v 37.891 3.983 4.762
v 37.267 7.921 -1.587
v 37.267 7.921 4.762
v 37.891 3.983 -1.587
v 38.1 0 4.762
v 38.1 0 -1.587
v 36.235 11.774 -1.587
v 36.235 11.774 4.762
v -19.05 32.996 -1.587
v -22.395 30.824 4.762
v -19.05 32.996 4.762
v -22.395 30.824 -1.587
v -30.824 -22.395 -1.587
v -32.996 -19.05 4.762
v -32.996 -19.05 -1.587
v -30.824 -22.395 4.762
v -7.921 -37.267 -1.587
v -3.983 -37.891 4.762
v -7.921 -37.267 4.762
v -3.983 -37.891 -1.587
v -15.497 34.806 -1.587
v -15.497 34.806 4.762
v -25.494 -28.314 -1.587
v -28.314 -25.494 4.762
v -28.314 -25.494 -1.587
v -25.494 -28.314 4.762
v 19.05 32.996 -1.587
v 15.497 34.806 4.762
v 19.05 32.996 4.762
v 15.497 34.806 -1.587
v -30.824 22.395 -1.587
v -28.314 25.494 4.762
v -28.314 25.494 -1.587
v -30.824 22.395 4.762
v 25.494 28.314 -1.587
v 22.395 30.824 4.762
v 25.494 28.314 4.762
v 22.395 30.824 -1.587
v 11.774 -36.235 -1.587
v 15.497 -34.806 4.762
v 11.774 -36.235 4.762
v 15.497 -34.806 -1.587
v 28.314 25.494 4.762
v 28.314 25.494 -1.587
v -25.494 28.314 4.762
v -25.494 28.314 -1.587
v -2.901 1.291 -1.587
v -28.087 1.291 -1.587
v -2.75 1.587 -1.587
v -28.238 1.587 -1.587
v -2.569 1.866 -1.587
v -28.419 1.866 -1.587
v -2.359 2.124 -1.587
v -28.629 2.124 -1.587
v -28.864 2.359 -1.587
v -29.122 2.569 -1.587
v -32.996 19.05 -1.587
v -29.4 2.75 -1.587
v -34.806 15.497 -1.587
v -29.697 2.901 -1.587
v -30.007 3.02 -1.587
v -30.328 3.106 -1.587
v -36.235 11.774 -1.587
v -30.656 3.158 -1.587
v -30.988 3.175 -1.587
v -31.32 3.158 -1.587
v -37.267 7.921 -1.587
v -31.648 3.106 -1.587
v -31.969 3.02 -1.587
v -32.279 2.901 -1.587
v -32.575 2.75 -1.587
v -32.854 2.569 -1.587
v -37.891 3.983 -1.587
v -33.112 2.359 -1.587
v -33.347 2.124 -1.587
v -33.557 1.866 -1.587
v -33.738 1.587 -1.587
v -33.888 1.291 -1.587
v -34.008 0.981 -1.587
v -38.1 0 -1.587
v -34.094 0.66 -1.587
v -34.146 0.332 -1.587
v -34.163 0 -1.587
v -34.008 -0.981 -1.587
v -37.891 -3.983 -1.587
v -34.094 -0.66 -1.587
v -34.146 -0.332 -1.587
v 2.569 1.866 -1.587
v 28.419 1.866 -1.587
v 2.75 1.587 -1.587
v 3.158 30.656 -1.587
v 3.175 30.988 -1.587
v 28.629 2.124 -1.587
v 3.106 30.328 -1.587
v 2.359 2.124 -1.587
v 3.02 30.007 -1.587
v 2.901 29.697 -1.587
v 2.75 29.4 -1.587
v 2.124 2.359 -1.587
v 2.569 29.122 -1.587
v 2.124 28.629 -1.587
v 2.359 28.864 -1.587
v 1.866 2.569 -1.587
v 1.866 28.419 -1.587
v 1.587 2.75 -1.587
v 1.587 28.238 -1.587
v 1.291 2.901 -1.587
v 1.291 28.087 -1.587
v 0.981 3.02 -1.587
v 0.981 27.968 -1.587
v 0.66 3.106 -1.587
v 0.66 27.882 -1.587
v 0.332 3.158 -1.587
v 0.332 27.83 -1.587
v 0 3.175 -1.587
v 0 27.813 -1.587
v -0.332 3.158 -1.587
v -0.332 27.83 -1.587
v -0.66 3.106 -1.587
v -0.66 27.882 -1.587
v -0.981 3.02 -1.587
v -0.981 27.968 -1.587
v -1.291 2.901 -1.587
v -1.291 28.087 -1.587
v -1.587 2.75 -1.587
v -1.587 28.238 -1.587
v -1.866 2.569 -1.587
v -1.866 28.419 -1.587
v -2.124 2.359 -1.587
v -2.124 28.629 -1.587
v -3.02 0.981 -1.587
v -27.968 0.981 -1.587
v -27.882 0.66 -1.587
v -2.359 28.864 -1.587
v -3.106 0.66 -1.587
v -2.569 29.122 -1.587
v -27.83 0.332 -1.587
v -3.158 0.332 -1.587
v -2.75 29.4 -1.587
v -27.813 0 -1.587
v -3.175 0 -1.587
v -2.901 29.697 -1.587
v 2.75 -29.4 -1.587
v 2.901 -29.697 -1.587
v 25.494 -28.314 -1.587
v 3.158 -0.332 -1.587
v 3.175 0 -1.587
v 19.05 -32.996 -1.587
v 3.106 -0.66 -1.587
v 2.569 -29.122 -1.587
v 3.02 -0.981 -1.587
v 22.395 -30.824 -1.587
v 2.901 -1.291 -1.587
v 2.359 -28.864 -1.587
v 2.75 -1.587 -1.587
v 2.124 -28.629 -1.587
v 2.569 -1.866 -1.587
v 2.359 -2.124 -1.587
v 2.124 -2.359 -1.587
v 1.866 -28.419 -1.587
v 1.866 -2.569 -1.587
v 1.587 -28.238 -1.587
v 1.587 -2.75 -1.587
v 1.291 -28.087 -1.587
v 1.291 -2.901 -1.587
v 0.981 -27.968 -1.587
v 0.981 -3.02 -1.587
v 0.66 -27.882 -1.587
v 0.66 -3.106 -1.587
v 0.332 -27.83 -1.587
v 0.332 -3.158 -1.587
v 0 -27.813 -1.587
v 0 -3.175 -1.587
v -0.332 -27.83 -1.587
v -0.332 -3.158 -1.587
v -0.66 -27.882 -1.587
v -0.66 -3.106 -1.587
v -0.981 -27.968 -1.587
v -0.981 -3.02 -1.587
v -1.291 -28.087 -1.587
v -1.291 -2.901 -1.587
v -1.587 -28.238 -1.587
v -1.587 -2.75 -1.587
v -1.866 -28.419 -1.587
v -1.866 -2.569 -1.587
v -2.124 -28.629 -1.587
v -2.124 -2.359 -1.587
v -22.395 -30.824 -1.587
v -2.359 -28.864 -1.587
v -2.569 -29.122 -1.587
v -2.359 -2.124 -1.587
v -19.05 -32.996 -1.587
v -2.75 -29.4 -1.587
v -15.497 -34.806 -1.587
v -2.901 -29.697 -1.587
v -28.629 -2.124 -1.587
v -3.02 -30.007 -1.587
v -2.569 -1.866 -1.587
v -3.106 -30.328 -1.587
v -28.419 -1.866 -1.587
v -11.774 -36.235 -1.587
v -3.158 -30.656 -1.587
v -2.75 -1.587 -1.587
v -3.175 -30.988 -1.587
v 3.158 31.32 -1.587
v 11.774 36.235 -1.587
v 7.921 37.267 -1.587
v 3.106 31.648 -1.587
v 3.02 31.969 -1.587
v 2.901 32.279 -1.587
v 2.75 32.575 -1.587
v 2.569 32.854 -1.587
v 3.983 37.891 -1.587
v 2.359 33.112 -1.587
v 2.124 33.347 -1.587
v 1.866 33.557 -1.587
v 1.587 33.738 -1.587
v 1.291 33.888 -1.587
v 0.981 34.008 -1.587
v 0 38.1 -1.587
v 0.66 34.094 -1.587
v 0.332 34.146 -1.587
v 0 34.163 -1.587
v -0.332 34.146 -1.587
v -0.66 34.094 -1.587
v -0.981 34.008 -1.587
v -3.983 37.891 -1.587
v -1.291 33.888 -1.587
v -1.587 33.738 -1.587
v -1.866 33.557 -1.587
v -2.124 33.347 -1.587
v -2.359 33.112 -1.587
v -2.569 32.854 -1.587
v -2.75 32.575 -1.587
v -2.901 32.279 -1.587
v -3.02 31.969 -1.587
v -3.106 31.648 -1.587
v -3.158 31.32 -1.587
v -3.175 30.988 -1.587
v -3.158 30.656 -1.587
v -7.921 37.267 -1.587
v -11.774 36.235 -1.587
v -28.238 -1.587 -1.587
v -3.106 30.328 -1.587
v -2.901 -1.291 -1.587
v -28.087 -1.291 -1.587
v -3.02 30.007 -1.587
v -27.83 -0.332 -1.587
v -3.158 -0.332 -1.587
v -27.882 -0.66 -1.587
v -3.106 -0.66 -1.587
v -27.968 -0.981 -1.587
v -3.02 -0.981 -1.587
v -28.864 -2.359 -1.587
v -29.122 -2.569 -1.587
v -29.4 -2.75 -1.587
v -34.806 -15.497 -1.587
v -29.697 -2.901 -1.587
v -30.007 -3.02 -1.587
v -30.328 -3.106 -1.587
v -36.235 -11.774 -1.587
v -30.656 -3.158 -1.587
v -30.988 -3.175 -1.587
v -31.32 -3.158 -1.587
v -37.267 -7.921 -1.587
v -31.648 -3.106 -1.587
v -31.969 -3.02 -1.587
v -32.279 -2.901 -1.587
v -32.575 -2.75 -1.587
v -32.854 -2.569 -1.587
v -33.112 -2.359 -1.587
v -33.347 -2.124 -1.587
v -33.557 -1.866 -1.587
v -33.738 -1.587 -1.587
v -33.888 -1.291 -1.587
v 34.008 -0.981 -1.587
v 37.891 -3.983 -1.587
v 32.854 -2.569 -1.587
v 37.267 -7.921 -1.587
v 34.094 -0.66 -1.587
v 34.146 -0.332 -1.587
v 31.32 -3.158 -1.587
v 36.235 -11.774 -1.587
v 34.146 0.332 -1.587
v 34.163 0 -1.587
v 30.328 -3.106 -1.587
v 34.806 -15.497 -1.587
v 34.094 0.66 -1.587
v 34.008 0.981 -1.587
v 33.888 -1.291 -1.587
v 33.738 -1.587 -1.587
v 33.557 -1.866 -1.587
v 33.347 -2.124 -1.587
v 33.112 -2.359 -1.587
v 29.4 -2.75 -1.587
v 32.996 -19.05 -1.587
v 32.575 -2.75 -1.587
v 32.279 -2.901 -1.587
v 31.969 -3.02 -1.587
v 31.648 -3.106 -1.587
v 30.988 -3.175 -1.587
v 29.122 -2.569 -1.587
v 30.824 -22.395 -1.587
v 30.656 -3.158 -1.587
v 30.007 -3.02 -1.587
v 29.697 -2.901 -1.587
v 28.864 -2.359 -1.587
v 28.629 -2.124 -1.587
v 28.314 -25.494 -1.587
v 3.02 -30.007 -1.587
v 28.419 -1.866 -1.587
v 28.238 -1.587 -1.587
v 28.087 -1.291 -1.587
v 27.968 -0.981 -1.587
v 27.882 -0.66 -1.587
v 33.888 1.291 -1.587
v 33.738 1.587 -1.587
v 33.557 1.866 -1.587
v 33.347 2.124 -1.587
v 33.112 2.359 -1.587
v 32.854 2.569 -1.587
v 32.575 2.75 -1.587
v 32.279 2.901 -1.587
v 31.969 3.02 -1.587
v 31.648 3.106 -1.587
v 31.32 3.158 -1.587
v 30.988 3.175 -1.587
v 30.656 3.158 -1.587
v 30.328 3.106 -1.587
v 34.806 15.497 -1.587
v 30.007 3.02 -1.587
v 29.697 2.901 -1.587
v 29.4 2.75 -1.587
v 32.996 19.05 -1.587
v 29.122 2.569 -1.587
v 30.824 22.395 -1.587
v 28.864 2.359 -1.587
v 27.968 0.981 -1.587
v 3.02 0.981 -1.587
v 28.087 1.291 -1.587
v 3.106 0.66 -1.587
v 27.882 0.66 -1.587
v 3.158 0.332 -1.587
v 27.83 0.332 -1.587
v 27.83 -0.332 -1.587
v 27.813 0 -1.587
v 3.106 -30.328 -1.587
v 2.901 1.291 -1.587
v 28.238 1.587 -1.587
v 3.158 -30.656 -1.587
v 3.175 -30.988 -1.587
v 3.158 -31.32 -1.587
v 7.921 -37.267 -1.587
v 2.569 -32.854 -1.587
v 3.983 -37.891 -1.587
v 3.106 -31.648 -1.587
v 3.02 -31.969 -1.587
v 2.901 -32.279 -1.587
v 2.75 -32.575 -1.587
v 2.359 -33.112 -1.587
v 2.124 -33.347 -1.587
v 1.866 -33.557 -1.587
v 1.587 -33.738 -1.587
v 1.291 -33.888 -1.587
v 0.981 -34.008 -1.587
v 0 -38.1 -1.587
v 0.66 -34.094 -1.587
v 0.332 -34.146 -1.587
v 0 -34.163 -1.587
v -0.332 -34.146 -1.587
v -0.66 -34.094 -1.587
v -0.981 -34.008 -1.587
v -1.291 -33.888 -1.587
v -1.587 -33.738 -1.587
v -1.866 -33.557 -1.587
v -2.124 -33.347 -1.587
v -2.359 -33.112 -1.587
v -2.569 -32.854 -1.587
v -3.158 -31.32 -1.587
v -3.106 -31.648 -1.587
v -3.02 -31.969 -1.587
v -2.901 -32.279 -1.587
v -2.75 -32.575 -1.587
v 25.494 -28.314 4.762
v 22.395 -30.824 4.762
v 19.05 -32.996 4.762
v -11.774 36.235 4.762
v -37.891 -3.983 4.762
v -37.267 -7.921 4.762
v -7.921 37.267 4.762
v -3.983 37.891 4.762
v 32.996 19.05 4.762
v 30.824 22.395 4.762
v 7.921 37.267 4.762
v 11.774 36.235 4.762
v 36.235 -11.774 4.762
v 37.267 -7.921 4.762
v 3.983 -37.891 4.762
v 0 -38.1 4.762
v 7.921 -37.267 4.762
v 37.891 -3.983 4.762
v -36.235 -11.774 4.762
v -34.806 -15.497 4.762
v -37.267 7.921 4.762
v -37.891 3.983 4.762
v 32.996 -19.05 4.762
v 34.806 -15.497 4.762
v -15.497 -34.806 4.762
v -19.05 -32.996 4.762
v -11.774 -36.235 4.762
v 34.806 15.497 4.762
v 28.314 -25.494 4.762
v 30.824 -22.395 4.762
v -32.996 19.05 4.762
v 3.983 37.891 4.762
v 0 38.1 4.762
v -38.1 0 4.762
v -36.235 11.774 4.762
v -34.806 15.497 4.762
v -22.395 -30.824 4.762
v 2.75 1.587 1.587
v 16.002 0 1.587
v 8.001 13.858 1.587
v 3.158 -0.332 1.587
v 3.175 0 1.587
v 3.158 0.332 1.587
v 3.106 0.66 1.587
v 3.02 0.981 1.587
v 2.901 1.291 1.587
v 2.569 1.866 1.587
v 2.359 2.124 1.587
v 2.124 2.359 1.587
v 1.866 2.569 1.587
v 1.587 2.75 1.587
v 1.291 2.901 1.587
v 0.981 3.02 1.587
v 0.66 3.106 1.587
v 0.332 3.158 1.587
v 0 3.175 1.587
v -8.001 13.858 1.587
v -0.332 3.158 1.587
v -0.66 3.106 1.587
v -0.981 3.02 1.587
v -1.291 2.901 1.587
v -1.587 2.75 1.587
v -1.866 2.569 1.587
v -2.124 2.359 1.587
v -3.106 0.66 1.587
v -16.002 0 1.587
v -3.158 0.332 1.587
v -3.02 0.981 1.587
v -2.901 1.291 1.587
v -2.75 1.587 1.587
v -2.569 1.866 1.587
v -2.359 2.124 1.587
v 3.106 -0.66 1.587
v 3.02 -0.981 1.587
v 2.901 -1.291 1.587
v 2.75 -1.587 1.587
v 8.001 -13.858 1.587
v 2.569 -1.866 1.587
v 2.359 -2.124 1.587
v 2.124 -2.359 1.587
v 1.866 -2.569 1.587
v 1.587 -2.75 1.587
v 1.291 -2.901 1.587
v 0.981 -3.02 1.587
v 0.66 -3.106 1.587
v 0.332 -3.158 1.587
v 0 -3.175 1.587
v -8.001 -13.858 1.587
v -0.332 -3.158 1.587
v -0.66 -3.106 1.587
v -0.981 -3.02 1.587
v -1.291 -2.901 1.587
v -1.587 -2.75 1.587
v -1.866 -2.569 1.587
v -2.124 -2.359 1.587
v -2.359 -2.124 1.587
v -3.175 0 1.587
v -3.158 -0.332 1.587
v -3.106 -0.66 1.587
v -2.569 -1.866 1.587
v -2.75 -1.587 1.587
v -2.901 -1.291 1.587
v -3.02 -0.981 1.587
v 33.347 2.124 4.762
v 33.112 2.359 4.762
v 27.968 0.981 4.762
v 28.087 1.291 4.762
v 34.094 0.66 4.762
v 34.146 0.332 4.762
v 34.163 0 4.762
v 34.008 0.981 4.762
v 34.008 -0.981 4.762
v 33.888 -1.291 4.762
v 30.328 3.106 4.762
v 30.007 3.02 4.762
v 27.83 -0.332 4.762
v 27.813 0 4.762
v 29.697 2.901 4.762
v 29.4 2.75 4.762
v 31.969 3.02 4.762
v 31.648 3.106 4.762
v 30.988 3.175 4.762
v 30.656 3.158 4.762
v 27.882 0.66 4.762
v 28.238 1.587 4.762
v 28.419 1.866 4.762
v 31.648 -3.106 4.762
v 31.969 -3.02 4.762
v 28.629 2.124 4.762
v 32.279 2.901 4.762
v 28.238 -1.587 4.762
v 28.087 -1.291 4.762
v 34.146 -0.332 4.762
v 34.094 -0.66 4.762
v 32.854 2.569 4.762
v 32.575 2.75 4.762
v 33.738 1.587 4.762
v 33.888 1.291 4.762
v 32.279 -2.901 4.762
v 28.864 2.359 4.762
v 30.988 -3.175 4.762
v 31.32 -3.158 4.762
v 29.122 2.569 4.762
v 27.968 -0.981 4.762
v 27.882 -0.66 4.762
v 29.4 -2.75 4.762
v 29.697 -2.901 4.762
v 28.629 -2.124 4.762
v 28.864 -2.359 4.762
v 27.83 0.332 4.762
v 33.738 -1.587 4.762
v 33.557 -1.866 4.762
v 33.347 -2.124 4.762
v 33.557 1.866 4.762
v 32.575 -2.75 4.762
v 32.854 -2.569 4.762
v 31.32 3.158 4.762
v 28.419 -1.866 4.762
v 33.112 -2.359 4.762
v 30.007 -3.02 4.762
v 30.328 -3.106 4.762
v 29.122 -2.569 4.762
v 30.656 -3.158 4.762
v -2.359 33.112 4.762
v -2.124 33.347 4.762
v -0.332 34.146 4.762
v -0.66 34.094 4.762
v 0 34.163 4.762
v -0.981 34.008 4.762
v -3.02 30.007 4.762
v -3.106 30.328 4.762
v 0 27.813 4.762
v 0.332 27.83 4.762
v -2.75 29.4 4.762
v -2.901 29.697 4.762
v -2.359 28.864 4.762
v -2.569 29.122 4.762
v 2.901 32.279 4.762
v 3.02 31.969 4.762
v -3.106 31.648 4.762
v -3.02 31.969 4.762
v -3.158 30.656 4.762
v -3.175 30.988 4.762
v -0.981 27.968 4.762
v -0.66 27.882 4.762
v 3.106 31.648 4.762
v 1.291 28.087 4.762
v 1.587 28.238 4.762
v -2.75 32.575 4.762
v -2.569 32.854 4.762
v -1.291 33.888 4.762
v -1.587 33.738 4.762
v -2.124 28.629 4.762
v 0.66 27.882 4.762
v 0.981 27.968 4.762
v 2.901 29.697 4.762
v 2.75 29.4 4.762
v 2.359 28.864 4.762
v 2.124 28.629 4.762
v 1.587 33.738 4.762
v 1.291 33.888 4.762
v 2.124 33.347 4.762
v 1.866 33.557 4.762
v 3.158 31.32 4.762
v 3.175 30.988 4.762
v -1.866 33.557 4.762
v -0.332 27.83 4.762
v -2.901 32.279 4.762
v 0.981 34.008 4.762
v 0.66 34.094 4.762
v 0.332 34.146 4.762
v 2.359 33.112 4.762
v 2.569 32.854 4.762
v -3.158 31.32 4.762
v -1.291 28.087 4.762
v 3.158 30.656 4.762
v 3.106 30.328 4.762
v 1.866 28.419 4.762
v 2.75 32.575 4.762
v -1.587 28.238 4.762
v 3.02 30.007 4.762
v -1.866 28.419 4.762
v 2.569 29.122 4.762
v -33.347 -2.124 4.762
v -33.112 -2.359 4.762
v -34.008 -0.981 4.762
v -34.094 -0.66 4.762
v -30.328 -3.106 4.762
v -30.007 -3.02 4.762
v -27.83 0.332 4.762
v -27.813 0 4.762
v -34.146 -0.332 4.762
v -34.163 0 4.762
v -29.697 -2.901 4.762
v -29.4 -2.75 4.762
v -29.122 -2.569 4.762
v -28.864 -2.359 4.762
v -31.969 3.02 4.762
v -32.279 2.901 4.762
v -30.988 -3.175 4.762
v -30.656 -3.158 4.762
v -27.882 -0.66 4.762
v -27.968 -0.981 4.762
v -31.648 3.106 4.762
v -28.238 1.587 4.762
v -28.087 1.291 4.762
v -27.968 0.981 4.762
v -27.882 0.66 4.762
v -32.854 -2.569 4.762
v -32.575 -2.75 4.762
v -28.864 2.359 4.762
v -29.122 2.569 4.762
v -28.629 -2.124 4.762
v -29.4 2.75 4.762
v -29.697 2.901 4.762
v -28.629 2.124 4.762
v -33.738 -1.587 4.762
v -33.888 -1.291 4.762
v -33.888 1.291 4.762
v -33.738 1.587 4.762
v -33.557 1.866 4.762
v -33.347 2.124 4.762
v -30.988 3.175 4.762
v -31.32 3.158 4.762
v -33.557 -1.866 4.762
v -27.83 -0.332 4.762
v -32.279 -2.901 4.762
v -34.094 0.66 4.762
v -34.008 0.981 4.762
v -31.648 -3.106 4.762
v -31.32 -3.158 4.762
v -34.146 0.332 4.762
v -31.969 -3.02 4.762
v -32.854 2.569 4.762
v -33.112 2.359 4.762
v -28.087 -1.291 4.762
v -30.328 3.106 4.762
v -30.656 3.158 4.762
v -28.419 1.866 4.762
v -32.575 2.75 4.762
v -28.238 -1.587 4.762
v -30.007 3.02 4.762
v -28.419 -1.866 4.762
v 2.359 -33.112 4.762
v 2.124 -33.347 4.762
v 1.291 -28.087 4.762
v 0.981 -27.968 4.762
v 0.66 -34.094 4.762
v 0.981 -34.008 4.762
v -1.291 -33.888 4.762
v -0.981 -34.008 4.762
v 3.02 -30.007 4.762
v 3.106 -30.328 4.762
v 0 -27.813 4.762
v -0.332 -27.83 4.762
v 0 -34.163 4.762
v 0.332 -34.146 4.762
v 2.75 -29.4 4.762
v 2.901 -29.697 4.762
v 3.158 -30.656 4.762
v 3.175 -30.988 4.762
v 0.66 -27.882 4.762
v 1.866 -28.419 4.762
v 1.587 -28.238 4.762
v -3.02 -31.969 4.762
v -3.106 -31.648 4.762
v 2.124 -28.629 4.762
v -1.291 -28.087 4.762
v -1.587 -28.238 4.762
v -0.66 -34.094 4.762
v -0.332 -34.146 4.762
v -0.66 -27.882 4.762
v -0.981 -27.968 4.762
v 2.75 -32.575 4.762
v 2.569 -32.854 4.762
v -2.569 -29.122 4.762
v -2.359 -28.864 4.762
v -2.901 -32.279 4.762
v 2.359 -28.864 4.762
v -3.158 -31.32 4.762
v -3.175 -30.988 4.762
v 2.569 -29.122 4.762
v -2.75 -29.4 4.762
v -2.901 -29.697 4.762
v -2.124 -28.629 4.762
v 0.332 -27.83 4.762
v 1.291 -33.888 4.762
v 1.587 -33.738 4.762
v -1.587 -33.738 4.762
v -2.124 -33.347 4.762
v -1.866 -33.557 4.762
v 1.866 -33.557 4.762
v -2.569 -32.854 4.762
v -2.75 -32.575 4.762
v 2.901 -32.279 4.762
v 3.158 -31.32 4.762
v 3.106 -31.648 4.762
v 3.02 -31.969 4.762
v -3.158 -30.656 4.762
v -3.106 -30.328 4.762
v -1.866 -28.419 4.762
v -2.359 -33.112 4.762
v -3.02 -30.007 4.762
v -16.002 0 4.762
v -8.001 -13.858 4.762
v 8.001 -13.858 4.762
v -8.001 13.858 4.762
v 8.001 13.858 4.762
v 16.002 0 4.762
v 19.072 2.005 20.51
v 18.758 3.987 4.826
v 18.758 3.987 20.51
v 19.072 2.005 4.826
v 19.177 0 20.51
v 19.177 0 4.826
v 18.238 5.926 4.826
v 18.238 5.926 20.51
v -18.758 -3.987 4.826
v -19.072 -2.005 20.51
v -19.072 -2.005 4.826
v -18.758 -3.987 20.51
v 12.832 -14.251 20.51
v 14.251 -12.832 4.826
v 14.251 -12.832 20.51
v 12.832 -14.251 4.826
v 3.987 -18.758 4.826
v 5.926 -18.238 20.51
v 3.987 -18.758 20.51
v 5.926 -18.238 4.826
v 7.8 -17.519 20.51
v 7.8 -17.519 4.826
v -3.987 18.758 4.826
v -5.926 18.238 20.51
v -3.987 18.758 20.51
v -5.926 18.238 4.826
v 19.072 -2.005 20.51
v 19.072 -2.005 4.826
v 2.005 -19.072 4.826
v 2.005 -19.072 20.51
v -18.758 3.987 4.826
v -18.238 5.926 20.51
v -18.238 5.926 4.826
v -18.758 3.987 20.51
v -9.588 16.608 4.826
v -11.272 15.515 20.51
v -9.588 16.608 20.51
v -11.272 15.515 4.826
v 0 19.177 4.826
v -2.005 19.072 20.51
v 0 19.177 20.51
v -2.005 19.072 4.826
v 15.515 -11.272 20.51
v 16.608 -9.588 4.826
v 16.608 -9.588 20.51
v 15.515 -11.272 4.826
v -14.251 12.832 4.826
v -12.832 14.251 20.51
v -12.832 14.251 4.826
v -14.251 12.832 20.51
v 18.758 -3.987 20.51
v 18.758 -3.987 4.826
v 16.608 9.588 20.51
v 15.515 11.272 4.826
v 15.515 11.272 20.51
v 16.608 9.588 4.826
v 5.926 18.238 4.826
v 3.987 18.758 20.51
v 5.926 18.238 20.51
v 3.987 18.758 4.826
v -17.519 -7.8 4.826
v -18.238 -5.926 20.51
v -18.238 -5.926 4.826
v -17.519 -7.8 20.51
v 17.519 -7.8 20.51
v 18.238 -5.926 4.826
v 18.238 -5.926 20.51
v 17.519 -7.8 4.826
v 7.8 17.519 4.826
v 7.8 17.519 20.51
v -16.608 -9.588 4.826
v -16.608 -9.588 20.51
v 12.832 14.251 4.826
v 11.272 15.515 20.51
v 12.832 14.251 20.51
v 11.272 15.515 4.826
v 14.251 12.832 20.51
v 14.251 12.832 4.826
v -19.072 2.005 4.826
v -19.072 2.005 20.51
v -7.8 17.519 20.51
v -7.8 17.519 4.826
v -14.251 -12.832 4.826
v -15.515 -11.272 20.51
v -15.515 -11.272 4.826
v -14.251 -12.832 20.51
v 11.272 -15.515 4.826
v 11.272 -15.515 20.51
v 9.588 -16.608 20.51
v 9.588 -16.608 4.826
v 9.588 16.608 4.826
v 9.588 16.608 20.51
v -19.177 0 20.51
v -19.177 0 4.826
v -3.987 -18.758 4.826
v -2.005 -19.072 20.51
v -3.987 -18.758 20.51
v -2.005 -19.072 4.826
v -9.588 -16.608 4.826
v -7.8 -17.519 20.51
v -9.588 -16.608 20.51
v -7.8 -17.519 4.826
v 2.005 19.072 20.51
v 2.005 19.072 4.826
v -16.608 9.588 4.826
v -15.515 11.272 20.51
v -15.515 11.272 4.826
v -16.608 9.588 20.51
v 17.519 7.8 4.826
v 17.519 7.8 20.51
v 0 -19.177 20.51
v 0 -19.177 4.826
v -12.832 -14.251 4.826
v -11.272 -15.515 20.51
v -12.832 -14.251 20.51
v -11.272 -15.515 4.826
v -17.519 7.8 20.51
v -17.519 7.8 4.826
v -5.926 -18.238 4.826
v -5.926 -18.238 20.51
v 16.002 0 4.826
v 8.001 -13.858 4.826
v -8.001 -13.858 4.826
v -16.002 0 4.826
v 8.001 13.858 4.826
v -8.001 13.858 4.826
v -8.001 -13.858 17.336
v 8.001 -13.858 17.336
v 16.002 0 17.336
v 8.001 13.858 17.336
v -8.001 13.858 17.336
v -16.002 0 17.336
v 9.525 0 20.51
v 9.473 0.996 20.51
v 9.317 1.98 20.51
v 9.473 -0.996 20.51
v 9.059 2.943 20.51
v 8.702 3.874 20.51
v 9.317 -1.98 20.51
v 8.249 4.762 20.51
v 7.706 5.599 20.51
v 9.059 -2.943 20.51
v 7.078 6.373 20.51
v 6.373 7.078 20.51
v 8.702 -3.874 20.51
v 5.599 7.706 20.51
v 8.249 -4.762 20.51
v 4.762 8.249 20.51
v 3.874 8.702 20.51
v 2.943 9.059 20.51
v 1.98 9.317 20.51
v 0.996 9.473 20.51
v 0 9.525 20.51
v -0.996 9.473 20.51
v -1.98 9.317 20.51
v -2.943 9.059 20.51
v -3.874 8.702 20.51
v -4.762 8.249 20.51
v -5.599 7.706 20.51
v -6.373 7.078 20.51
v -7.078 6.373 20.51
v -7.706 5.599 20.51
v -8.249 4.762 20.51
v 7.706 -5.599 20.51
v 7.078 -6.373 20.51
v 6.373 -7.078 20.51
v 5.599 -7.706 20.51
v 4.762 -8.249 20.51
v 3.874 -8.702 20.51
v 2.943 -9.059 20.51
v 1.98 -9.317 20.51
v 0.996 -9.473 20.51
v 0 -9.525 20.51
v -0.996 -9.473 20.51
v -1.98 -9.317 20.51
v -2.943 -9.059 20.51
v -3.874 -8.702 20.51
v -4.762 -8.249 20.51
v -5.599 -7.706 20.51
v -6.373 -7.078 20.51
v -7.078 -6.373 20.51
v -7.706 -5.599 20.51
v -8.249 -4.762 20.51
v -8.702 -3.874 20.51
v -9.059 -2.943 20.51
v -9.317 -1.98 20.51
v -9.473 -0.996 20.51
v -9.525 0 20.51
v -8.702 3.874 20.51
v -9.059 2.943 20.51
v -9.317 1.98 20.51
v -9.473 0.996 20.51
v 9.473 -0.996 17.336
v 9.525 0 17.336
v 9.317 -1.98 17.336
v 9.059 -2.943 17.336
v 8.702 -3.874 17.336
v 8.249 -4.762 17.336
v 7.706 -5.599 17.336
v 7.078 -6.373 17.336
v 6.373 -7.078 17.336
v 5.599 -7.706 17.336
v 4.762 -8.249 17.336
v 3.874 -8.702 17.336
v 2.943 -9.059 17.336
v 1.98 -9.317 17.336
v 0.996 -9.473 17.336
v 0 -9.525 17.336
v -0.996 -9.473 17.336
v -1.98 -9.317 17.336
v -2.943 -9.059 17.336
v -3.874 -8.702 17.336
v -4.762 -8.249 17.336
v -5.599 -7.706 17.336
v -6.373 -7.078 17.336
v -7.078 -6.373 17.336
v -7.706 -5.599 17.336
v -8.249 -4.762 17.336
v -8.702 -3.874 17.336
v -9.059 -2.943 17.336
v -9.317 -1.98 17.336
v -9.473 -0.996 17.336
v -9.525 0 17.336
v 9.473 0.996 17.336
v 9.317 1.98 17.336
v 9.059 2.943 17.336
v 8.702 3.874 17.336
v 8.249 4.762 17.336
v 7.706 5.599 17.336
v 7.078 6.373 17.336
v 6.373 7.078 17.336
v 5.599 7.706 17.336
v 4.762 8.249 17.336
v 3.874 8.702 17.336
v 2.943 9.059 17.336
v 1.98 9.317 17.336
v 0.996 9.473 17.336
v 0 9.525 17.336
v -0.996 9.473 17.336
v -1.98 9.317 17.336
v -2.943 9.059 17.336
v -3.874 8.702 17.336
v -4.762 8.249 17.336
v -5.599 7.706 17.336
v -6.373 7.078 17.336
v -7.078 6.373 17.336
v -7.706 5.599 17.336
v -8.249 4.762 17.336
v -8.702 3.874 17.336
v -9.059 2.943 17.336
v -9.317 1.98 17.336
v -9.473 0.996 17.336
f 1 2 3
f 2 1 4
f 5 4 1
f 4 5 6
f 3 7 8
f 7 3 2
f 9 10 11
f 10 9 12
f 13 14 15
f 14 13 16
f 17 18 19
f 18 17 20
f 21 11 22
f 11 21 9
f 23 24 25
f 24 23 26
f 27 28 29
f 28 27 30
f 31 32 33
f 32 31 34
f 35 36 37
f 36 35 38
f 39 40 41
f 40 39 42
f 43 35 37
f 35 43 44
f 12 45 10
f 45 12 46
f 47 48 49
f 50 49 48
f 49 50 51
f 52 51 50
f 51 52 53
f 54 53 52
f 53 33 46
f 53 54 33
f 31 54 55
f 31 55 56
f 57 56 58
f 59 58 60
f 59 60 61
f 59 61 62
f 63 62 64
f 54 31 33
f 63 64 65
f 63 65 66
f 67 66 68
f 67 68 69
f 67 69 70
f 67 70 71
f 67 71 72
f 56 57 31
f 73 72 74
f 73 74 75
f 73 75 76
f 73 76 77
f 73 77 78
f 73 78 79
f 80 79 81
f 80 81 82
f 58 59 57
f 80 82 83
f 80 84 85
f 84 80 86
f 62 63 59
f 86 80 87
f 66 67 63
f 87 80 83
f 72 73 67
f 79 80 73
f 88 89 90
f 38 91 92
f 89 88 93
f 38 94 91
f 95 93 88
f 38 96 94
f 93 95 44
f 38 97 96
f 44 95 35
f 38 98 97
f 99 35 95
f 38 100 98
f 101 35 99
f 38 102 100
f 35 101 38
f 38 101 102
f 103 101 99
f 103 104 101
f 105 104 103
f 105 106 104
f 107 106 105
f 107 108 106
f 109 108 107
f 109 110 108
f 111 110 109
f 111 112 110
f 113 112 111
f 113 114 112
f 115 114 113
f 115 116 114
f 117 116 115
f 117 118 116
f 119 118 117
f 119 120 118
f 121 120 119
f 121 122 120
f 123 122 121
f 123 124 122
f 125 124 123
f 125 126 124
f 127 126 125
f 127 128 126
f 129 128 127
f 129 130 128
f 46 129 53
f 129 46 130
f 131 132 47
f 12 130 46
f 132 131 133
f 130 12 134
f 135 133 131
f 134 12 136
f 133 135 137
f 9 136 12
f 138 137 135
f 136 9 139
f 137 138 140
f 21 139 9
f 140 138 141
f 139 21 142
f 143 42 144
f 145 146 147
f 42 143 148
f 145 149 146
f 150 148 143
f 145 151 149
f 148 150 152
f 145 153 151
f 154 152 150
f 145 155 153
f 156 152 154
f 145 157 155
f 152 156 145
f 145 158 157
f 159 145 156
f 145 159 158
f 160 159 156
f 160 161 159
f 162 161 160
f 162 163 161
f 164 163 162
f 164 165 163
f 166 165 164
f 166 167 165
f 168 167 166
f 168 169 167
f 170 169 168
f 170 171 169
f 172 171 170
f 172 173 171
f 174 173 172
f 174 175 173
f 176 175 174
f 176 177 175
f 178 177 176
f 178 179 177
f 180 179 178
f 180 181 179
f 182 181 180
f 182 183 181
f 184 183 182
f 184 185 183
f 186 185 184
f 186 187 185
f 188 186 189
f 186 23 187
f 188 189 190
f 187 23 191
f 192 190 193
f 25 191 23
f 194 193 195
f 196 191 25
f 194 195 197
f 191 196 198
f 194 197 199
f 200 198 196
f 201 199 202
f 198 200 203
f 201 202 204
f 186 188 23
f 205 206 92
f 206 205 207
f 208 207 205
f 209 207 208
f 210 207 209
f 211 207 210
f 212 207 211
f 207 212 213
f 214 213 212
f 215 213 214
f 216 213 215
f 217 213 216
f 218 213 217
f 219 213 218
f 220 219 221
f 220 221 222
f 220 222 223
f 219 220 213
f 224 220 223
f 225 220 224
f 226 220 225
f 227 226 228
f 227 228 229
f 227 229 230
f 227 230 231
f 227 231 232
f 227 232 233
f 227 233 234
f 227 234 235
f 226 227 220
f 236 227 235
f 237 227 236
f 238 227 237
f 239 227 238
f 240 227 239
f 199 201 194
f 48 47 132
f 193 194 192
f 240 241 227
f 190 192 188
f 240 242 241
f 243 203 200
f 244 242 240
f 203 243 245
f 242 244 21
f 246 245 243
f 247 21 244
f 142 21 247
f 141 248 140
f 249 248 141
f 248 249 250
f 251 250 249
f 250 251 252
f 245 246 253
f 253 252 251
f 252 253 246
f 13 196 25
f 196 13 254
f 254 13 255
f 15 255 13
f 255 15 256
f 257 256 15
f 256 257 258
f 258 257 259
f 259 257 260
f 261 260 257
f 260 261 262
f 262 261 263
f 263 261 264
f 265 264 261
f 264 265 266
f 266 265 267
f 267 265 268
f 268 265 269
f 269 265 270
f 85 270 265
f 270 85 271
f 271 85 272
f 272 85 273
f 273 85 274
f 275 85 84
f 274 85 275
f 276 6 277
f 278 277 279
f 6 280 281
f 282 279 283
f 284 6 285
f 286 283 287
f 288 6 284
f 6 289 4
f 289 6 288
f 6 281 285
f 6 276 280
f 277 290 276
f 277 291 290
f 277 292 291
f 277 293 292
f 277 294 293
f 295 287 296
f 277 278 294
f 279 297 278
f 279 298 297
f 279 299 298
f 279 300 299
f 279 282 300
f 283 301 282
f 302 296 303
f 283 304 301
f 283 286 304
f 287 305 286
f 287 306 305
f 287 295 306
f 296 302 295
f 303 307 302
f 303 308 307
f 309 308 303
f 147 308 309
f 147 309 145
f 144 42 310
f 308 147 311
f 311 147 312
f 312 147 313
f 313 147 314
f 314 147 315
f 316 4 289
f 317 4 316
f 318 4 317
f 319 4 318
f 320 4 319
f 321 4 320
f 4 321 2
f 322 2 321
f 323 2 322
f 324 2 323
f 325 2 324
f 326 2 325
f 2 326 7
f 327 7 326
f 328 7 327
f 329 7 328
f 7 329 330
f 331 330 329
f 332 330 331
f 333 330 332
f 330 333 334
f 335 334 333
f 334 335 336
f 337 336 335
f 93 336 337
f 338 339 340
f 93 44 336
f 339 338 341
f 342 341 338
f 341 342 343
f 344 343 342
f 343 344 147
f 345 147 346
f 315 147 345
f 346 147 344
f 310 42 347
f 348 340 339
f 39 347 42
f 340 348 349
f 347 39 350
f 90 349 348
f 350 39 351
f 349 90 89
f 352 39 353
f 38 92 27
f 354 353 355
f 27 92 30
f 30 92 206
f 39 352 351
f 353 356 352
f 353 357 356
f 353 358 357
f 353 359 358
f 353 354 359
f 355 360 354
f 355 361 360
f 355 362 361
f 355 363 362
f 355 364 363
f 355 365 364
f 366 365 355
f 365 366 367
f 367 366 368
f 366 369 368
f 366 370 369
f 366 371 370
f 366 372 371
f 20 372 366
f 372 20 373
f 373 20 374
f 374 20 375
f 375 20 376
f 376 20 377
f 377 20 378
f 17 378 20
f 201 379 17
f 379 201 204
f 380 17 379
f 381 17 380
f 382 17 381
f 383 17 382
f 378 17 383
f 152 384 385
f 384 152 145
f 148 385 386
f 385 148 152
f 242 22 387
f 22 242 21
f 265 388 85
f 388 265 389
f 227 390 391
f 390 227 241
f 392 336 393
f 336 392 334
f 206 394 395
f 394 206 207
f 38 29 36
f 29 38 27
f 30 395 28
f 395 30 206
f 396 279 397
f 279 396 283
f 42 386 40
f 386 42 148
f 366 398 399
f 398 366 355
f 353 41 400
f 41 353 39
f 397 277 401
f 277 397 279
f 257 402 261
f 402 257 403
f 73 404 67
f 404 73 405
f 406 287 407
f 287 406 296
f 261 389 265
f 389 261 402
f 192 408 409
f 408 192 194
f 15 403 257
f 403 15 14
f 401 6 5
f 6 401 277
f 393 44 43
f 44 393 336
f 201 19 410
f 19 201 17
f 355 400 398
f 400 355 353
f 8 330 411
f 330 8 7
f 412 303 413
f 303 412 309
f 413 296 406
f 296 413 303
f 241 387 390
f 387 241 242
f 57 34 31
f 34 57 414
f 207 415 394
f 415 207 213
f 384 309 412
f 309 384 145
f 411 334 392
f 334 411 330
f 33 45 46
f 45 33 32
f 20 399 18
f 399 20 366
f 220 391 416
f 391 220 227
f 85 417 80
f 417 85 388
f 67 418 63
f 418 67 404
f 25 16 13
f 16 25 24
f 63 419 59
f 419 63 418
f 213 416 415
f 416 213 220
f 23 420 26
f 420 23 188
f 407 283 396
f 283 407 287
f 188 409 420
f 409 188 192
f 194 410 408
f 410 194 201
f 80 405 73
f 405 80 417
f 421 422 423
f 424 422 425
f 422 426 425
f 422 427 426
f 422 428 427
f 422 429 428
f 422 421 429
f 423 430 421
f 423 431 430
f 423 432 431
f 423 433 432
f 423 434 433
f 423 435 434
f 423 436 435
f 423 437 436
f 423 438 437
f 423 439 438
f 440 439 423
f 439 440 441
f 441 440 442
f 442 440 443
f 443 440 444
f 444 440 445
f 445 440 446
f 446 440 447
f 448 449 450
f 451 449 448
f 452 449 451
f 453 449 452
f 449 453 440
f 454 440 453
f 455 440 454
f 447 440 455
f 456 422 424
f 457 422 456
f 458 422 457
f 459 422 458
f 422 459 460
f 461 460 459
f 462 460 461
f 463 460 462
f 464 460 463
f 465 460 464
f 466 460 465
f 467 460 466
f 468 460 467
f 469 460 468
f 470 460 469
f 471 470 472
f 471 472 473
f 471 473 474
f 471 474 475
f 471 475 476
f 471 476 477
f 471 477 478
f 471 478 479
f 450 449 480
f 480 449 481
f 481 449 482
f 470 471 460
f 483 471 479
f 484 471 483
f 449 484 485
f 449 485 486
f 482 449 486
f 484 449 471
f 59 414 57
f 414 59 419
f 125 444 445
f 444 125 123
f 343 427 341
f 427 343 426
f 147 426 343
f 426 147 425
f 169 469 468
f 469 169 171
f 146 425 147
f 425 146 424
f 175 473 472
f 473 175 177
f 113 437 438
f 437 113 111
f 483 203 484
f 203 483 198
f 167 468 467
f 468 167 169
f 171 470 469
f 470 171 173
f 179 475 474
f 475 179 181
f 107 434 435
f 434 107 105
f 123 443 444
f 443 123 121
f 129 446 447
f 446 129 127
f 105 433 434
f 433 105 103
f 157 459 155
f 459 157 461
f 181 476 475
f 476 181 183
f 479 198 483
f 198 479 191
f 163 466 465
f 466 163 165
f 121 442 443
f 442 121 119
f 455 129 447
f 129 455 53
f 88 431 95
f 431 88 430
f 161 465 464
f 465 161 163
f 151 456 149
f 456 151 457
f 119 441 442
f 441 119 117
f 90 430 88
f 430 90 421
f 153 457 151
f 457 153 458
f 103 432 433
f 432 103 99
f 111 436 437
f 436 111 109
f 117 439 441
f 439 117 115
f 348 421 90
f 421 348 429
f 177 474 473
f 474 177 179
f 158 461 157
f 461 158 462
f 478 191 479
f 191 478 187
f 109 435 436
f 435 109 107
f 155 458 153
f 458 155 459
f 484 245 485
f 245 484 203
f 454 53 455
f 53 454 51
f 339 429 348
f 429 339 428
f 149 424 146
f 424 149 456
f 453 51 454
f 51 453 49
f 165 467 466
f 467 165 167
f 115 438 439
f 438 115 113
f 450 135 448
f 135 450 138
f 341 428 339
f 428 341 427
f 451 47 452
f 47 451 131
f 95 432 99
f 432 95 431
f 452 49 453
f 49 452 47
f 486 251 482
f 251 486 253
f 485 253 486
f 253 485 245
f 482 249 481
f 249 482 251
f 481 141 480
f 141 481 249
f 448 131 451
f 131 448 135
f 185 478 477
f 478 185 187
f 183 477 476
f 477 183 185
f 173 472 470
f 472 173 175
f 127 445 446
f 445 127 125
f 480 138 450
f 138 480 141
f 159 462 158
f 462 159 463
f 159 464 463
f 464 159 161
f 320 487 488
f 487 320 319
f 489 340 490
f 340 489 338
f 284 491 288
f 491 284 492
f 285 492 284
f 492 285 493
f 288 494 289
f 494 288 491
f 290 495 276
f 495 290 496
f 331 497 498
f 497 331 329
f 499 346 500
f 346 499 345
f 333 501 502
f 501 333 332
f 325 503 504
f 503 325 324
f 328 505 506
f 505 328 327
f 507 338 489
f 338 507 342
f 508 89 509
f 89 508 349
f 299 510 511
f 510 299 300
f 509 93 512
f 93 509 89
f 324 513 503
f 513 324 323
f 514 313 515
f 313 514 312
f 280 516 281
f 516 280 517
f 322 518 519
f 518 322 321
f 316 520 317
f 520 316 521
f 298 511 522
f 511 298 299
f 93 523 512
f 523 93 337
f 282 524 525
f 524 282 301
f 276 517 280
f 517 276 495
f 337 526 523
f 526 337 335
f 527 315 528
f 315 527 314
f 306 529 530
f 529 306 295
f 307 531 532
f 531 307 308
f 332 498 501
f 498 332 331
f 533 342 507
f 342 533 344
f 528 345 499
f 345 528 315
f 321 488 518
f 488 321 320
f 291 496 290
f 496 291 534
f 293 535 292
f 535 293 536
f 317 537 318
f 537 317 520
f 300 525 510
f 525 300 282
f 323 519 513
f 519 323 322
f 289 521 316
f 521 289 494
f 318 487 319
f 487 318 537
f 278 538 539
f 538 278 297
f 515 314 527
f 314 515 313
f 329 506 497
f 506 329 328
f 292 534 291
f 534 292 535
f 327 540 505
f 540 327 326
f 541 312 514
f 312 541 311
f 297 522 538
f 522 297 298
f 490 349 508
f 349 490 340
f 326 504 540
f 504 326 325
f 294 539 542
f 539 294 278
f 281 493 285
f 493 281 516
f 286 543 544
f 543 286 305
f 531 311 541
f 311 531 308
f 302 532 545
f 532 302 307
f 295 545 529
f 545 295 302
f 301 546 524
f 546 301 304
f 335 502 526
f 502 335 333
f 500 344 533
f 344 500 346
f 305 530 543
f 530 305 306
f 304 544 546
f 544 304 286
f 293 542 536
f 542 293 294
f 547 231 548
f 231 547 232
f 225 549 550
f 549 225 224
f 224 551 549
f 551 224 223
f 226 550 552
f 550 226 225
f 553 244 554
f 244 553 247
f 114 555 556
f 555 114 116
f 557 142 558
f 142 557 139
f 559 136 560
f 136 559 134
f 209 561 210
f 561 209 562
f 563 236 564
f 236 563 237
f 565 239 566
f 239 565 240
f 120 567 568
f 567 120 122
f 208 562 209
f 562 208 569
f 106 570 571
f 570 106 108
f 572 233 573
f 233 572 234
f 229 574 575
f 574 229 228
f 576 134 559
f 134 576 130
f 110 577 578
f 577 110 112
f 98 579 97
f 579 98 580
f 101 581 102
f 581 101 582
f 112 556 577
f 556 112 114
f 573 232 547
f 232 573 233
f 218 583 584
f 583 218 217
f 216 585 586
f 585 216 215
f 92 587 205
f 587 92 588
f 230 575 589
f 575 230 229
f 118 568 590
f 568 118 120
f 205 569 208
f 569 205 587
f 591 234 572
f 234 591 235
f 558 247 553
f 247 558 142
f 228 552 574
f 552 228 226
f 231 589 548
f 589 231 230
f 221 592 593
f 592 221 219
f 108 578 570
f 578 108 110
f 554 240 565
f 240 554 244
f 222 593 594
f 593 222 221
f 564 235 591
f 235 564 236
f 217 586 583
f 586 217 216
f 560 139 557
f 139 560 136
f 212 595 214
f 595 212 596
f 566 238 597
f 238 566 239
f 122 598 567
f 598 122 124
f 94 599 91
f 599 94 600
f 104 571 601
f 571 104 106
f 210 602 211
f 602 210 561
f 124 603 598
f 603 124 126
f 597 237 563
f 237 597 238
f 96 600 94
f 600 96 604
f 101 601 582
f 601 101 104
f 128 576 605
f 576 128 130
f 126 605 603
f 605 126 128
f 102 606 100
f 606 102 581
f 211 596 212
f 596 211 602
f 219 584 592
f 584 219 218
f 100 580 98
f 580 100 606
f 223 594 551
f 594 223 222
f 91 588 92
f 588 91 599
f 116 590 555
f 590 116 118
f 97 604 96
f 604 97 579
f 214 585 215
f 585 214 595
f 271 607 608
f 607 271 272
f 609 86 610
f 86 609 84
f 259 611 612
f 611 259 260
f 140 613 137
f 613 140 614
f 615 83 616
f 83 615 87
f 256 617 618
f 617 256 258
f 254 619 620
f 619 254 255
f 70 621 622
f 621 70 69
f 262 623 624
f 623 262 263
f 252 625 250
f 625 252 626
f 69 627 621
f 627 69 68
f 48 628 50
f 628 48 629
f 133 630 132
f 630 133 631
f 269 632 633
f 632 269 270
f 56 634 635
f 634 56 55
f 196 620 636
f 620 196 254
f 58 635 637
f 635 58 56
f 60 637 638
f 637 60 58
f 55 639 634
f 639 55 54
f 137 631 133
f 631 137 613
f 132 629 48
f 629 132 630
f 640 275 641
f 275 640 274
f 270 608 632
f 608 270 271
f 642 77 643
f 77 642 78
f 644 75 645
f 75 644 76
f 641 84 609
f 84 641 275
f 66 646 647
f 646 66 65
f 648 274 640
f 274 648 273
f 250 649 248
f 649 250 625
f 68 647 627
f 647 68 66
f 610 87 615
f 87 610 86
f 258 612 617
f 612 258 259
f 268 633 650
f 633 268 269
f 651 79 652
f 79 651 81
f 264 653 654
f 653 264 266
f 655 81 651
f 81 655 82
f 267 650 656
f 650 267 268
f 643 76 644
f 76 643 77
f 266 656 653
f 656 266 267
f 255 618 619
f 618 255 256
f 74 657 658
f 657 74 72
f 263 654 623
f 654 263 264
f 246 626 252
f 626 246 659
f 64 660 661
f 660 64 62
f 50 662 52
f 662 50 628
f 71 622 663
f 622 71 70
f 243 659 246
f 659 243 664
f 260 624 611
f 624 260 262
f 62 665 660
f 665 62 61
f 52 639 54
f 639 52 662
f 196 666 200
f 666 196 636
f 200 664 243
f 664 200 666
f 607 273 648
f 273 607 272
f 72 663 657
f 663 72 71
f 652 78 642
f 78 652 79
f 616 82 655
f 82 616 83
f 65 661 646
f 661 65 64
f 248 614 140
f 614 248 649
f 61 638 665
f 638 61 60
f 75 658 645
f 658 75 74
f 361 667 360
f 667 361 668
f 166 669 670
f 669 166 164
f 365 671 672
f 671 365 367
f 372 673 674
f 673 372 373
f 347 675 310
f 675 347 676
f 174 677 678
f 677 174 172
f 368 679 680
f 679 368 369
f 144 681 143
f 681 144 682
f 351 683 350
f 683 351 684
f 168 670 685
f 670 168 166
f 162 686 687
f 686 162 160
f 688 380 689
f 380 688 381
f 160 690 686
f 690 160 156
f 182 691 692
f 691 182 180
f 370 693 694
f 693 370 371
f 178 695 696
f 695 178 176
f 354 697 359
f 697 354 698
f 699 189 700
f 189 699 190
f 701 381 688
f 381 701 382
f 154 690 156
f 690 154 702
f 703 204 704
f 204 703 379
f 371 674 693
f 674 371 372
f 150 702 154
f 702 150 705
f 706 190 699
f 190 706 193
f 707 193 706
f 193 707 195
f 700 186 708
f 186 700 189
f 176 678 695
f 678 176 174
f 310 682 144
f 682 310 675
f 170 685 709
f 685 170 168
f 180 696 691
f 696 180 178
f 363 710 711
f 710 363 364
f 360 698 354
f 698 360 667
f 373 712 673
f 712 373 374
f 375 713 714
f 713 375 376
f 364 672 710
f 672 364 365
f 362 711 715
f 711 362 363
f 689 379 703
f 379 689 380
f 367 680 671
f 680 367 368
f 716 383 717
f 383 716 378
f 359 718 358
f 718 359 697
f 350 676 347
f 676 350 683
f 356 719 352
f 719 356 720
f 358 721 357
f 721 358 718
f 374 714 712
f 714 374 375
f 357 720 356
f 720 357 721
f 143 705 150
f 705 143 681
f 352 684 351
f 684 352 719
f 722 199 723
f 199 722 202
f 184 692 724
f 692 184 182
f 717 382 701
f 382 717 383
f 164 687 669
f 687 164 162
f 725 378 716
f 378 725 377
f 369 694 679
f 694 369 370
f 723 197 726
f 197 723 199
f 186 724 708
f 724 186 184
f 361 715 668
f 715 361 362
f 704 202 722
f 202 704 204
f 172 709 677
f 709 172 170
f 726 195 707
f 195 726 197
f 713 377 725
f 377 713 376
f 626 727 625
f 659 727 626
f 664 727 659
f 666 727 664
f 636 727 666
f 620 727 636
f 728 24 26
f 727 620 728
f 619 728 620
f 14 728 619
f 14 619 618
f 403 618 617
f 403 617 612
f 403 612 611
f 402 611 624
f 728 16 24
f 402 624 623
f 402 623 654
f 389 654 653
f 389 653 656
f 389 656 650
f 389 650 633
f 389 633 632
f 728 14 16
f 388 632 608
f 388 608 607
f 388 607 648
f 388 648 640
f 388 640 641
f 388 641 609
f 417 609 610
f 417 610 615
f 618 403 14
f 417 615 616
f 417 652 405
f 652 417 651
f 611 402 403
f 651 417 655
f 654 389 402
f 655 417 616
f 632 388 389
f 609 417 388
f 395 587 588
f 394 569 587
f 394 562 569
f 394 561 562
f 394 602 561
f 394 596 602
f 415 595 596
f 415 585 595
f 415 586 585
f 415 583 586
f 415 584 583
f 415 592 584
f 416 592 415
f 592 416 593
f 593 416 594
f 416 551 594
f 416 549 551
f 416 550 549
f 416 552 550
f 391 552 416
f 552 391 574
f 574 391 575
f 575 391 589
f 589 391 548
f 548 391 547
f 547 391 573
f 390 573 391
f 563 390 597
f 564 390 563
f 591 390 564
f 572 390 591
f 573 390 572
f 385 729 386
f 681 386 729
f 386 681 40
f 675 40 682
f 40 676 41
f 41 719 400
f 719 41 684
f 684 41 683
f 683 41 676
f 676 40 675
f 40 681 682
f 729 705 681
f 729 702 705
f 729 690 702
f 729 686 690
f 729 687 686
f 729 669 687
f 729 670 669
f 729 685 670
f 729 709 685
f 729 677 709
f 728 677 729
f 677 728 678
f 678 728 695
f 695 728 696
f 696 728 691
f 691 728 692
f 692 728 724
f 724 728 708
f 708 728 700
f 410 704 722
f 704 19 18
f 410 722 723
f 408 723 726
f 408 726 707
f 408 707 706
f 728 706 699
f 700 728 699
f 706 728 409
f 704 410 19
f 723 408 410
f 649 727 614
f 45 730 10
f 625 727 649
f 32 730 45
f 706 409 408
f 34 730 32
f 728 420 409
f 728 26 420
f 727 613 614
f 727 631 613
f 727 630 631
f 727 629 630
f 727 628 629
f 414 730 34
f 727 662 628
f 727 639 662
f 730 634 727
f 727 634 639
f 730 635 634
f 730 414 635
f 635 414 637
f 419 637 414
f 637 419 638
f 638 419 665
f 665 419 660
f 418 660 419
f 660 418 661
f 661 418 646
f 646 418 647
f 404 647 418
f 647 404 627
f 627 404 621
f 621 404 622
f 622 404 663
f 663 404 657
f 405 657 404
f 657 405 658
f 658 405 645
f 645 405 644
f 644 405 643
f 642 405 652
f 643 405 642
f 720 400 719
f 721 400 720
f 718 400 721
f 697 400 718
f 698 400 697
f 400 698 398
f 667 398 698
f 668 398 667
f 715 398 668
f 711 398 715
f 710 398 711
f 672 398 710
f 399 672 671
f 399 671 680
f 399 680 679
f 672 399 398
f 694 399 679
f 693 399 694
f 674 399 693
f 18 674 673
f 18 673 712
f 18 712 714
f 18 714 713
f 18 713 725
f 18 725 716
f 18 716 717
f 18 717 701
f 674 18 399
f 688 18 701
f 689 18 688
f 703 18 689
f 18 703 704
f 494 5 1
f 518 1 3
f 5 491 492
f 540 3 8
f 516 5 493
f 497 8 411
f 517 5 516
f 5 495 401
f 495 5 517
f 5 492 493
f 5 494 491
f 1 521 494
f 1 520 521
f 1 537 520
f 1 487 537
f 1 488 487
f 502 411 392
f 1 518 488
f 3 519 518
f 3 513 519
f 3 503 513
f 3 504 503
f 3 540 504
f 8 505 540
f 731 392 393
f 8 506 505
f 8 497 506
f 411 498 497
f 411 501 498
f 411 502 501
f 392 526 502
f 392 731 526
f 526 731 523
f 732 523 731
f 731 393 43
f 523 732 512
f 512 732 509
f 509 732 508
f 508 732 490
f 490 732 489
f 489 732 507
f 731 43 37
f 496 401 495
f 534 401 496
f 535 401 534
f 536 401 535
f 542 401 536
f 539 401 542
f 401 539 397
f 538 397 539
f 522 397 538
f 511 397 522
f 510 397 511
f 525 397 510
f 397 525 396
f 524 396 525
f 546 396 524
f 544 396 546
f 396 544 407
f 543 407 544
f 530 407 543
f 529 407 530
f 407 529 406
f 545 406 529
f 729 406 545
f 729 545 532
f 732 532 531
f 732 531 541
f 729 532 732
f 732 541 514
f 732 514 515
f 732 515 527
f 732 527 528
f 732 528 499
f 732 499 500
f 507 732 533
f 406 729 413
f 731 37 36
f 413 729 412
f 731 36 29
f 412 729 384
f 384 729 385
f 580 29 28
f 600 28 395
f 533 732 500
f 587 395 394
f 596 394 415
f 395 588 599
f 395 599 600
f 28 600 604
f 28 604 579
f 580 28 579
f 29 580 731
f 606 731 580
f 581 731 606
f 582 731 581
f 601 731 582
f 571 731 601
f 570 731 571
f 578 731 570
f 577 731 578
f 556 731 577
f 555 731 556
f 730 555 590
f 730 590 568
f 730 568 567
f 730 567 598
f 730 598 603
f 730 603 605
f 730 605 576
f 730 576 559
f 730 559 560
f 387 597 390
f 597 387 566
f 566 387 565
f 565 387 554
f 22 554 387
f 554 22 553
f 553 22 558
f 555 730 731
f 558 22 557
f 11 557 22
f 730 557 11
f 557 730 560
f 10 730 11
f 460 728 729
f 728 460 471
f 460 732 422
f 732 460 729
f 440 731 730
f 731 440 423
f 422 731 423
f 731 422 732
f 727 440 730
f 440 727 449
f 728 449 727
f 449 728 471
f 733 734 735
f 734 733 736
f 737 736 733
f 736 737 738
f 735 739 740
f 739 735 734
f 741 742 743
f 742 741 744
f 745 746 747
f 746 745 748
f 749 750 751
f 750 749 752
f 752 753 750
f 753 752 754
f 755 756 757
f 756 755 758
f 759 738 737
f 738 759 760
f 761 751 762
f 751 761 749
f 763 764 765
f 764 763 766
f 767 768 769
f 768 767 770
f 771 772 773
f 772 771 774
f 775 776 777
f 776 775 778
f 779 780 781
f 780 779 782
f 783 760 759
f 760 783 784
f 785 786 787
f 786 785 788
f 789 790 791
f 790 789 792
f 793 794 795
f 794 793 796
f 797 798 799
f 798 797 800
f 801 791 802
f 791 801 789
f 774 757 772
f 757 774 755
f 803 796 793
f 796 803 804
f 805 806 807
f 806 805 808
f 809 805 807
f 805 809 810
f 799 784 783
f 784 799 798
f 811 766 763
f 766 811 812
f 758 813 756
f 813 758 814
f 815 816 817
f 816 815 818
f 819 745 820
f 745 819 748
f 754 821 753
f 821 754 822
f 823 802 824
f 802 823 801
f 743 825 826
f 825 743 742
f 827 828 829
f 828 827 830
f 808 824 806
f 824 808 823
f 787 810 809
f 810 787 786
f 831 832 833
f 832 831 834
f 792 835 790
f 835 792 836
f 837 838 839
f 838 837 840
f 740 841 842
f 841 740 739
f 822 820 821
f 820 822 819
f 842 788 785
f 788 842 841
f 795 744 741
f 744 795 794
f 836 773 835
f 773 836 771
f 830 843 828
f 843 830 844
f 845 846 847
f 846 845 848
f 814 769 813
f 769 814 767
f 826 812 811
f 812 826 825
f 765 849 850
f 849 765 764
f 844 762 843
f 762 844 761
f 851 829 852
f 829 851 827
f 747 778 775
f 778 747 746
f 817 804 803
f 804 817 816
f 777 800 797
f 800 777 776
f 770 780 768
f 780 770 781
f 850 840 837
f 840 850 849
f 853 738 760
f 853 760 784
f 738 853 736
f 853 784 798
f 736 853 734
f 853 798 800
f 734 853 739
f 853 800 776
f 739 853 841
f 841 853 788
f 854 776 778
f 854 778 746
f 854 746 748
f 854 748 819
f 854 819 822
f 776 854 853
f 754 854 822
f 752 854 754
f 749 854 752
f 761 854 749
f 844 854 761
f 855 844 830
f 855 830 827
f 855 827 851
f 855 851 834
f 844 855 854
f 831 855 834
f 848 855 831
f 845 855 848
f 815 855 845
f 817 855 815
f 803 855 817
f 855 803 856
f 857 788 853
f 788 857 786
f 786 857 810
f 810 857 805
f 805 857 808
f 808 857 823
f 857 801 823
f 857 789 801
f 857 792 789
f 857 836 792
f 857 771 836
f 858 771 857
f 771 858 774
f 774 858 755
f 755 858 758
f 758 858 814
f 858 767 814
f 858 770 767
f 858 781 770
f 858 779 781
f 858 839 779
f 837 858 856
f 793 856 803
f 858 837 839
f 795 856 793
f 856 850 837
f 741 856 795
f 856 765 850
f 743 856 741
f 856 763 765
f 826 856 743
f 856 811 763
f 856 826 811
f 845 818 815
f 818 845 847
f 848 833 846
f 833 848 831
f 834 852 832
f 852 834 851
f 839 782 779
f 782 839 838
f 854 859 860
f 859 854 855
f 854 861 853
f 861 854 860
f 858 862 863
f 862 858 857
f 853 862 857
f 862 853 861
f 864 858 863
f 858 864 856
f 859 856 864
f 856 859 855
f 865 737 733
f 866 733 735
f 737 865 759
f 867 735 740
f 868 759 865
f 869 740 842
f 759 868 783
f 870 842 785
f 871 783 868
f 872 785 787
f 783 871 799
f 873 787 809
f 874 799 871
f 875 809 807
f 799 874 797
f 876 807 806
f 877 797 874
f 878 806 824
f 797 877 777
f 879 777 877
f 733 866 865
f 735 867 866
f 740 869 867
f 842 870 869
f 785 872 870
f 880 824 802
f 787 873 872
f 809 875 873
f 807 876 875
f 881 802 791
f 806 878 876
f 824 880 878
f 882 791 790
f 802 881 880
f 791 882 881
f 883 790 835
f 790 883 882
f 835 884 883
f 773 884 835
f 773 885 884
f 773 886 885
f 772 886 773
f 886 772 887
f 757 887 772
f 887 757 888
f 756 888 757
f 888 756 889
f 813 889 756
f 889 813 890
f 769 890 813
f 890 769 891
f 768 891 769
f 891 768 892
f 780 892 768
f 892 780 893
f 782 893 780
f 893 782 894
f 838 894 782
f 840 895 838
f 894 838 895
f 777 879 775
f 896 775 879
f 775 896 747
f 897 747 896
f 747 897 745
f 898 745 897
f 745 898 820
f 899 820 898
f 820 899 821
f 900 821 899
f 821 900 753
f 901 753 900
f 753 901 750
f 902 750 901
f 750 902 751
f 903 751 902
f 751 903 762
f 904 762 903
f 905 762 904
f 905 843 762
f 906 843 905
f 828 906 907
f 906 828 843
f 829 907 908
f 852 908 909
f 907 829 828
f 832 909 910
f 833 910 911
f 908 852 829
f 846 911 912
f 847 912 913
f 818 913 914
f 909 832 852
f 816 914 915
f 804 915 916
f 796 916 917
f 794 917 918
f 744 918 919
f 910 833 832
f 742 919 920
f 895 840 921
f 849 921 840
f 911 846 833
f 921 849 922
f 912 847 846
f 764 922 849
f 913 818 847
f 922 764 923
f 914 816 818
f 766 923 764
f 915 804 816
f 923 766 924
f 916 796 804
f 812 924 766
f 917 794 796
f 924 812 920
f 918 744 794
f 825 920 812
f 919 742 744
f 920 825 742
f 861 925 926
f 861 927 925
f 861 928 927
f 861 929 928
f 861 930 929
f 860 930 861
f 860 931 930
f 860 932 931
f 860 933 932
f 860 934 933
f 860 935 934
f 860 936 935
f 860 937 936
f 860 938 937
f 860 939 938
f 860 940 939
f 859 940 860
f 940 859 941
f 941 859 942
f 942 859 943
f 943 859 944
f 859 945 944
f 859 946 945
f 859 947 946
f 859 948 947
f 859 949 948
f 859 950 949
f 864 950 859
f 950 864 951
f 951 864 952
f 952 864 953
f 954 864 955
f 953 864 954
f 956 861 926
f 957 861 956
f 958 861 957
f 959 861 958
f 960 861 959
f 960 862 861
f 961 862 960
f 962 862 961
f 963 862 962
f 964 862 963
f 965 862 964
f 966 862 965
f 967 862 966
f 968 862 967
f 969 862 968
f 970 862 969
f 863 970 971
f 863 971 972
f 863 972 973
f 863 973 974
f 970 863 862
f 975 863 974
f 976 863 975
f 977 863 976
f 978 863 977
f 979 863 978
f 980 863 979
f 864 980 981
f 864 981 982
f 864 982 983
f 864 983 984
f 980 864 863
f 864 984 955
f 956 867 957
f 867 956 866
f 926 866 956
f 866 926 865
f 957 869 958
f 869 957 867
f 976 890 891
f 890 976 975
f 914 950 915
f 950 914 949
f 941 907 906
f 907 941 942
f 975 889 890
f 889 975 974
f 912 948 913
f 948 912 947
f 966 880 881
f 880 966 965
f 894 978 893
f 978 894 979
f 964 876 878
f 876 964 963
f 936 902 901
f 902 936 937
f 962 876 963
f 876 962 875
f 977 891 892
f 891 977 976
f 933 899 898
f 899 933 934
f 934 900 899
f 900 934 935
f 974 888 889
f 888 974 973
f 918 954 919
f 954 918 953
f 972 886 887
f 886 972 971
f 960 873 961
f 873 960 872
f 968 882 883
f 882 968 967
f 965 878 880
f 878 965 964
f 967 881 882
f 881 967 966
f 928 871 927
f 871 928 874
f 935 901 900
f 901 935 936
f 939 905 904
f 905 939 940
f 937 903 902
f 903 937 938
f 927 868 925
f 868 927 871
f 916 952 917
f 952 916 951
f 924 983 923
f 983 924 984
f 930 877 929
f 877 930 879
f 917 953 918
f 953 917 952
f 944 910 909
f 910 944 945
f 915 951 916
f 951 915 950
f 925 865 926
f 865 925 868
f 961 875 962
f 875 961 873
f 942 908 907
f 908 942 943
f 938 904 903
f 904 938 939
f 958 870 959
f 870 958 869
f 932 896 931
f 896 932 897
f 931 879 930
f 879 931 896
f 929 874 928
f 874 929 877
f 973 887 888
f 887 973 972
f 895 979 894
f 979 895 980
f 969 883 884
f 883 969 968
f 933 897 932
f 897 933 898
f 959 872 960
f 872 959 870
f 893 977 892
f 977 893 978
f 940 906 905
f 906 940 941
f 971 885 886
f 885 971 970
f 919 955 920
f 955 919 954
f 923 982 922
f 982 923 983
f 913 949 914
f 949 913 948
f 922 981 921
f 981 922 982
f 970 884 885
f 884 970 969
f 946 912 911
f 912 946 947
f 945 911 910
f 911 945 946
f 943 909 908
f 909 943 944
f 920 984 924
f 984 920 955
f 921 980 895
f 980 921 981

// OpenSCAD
//Chuck Adapter for Wooden Lathe

spindle=.75;

chuck=3;

nutsurround=.25;
nutsize=1.26; //longest point to point outside of nut
nutthick=.62;

materialthick=.125;

centerbolt=.25;

mountholenum=4;
mountholedia=.25;

res=60;

module nut(){
difference(){
cylinder(h=nutthick, d=nutsize, center=true, $fn=6);
cylinder(h=nutthick, d=spindle, center=true, $fn=res);
}
}

module solidnut(){
difference(){
    cylinder(h=nutthick, d=nutsize, center=true, $fn=6);
}
}

module nutspindle(){
    difference(){
        cylinder(h=materialthick, d=nutsize+nutsurround, center=true, $fn=res);
        cylinder(h=materialthick, d=spindle, center=true, $fn=res);
    }
}

module chucknut(){
difference(){
    cylinder(h=nutthick-materialthick, d=nutsize+nutsurround, center=true, $fn=res);
    solidnut();
}
}

module mountnut(){
    difference(){
        difference(){
        cylinder(h=materialthick, d=chuck, center=true, $fn=res);
        solidnut();
    }
    for (i=[0:mountholenum])
        {rotate([0,0,i*360/mountholenum])
        translate ([(chuck/2-(nutthick/2+nutsurround)/2), 0, 0])cylinder(h=materialthick, d=mountholedia, center=true, $fn=res);}
}
}

module mountplate(){
difference(){
    difference(){
        cylinder(h=materialthick, d=chuck, center=true, $fn=res);
        cylinder(h=materialthick, d=centerbolt, center=true, $fn=res);
    }
    for (i=[0:mountholenum])
        {rotate([0,0,i*360/mountholenum])
        translate ([(chuck/2-(nutthick/2+nutsurround)/2), 0, 0])cylinder(h=materialthick, d=mountholedia, center=true, $fn=res);}
}
}


module fulladapter(){
    mountplate();
    translate([0,0,materialthick]) mountnut();
    translate([0,0,3.5*materialthick]) chucknut();
    translate([0,0,(nutthick+materialthick)]) nutspindle();
}

scale([25.4,25.4,25.4])

fulladapter();
//mountplate();
//mountnut();
//chucknut();
//nutspindle();
